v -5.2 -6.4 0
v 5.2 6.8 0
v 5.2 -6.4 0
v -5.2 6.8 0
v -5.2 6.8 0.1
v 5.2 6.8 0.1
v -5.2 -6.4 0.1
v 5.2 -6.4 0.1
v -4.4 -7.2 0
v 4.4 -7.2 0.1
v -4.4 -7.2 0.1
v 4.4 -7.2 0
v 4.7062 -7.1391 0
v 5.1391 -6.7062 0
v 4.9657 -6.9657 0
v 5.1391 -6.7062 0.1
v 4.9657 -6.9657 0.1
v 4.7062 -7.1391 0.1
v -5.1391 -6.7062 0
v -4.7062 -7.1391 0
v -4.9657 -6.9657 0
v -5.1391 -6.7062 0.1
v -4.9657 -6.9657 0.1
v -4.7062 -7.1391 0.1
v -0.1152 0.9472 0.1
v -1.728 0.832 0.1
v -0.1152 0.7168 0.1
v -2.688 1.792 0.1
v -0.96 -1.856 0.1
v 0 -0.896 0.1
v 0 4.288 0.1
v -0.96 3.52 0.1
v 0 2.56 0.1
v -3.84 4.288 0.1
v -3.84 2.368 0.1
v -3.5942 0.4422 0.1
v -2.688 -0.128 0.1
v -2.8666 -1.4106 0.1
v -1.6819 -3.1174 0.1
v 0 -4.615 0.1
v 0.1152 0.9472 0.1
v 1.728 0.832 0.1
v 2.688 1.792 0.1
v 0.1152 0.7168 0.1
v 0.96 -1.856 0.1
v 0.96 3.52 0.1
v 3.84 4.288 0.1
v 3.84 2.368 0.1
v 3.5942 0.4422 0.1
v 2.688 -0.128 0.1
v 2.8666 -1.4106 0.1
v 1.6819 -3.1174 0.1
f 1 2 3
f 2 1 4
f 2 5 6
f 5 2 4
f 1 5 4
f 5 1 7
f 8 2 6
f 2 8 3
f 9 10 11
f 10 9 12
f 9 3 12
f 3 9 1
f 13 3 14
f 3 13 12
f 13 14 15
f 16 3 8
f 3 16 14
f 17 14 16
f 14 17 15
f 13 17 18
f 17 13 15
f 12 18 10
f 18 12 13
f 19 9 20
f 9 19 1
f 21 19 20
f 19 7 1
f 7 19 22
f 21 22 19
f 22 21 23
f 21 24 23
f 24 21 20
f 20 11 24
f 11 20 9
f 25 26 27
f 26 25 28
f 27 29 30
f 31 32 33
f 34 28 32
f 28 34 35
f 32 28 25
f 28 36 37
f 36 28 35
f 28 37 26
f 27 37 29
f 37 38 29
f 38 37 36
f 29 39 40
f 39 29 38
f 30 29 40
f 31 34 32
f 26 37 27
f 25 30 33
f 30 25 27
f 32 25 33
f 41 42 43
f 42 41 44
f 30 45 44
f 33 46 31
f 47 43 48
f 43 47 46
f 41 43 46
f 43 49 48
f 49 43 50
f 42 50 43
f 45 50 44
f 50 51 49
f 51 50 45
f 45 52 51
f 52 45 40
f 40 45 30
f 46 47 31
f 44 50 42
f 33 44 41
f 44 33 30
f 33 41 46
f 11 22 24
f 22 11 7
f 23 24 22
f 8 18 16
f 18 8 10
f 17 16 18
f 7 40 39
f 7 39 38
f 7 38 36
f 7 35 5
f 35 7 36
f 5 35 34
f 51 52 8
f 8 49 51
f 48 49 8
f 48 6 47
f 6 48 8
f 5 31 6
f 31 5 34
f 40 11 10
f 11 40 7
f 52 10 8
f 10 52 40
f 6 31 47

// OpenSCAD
// file: ../p/1-4cyli.scad
use <../lib.scad>
function ldraw_lib__1_4cyli() = [
// 0 Cylinder 0.25
// 0 Name: 1-4cyli.dat
// 0 Author: James Jessiman
// 0 !LDRAW_ORG Primitive UPDATE 2012-01
// 0 !LICENSE Licensed under CC BY 2.0 and CC BY 4.0 : see CAreadme.txt
// 
// 0 BFC CERTIFY CCW
  [0,"BFC","CERTIFY"],
  [0,"BFC","CCW"],
// 
// 0 !HISTORY 2002-03-23 [sbliss] Added BFC statement.
// 0 !HISTORY 2002-04-25 [PTadmin] Official Update 2002-02
// 0 !HISTORY 2007-06-22 [PTadmin] Header formatted for Contributor Agreement
// 0 !HISTORY 2008-07-01 [PTadmin] Official Update 2008-01
// 0 !HISTORY 2012-02-16 [Philo] Changed to CCW
// 0 !HISTORY 2012-03-30 [PTadmin] Official Update 2012-01
// 
// 
// 4 16 1 1 0 0.9239 1 0.3827 0.9239 0 0.3827 1 0 0
  [4,16,1,1,0,0.9239,1,0.3827,0.9239,0,0.3827,1,0,0],
// 5 24 1 0 0 1 1 0 0.9239 0 0.3827 1 0 -1
  [5,24,1,0,0,1,1,0,0.9239,0,0.3827,1,0,-1],
// 4 16 0.9239 1 0.3827 0.7071 1 0.7071 0.7071 0 0.7071 0.9239 0 0.3827
  [4,16,0.9239,1,0.3827,0.7071,1,0.7071,0.7071,0,0.7071,0.9239,0,0.3827],
// 5 24 0.9239 0 0.3827 0.9239 1 0.3827 0.7071 0 0.7071 1 0 0
  [5,24,0.9239,0,0.3827,0.9239,1,0.3827,0.7071,0,0.7071,1,0,0],
// 4 16 0.7071 1 0.7071 0.3827 1 0.9239 0.3827 0 0.9239 0.7071 0 0.7071
  [4,16,0.7071,1,0.7071,0.3827,1,0.9239,0.3827,0,0.9239,0.7071,0,0.7071],
// 5 24 0.7071 0 0.7071 0.7071 1 0.7071 0.3827 0 0.9239 0.9239 0 0.3827
  [5,24,0.7071,0,0.7071,0.7071,1,0.7071,0.3827,0,0.9239,0.9239,0,0.3827],
// 4 16 0.3827 1 0.9239 0 1 1 0 0 1 0.3827 0 0.9239
  [4,16,0.3827,1,0.9239,0,1,1,0,0,1,0.3827,0,0.9239],
// 5 24 0.3827 0 0.9239 0.3827 1 0.9239 0 0 1 0.7071 0 0.7071
  [5,24,0.3827,0,0.9239,0.3827,1,0.9239,0,0,1,0.7071,0,0.7071],
// 5 24 0 0 1 0 1 1 0.3827 0 0.9239 -1 0 1
  [5,24,0,0,1,0,1,1,0.3827,0,0.9239,-1,0,1],
];
makepoly(ldraw_lib__1_4cyli(), line=0.2);
// file: s/3238s02.scad
use <../../lib.scad>
use <../../p/1-4chrd.scad>
use <../../p/1-4cyli.scad>
function ldraw_lib__s__3238s02() = [
// 0 ~Sticker Minifig Vest - box
// 0 Name: s\3238s02.dat
// 0 Author: Alex Taylor [anathema]
// 0 !LDRAW_ORG Subpart UPDATE 2020-03
// 0 !LICENSE Licensed under CC BY 2.0 and CC BY 4.0 : see CAreadme.txt
// 
// 0 BFC CERTIFY CCW
  [0,"BFC","CERTIFY"],
  [0,"BFC","CCW"],
// 
// 0 !HISTORY 2010-04-05 [PTadmin] Official Update 2010-01
// 0 !HISTORY 2020-11-01 [MMR1988] Fixed t-junctions
// 0 !HISTORY 2020-12-29 [PTadmin] Official Update 2020-03
// 
// 
// 4 16 13 0 17 13 0 -16 -13 0 -16 -13 0 17
  [4,16,13,0,17,13,0,-16,-13,0,-16,-13,0,17],
// 4 16 -13 -0.25 17 13 -0.25 17 13 0 17 -13 0 17
  [4,16,-13,-0.25,17,13,-0.25,17,13,0,17,-13,0,17],
// 4 16 -13 0 17 -13 0 -16 -13 -0.25 -16 -13 -0.25 17
  [4,16,-13,0,17,-13,0,-16,-13,-0.25,-16,-13,-0.25,17],
// 4 16 13 -0.25 17 13 -0.25 -16 13 0 -16 13 0 17
  [4,16,13,-0.25,17,13,-0.25,-16,13,0,-16,13,0,17],
// 4 16 -11 0 -18 11 0 -18 11 -0.25 -18 -11 -0.25 -18
  [4,16,-11,0,-18,11,0,-18,11,-0.25,-18,-11,-0.25,-18],
// 4 16 -13 0 -16 13 0 -16 11 0 -18 -11 0 -18
  [4,16,-13,0,-16,13,0,-16,11,0,-18,-11,0,-18],
// 1 16 11 0 -16 0 0 2 0 -1 0 -2 0 0 1-4chrd.dat
  [1,16,11,0,-16,0,0,2,0,-1,0,-2,0,0, ldraw_lib__1_4chrd()],
// 1 16 11 0 -16 2 0 0 0 -0.25 0 0 0 -2 1-4cyli.dat
  [1,16,11,0,-16,2,0,0,0,-0.25,0,0,0,-2, ldraw_lib__1_4cyli()],
// 1 16 -11 0 -16 0 0 -2 0 -1 0 -2 0 0 1-4chrd.dat
  [1,16,-11,0,-16,0,0,-2,0,-1,0,-2,0,0, ldraw_lib__1_4chrd()],
// 1 16 -11 0 -16 -2 0 0 0 -0.25 0 0 0 -2 1-4cyli.dat
  [1,16,-11,0,-16,-2,0,0,0,-0.25,0,0,0,-2, ldraw_lib__1_4cyli()],
];
makepoly(ldraw_lib__s__3238s02(), line=0.2);
// file: s/003238s6.scad
use <../../lib.scad>
function ldraw_lib__s__003238s6() = [
// 0 ~White Maltese Cross on Red - 1/2 Pattern
// 0 Name: s\003238s6.dat
// 0 Author: Alex Taylor [anathema]
// 0 !LDRAW_ORG Subpart UPDATE 2020-03
// 0 !LICENSE Licensed under CC BY 2.0 and CC BY 4.0 : see CAreadme.txt
// 
// 0 BFC CERTIFY CCW
  [0,"BFC","CERTIFY"],
  [0,"BFC","CCW"],
// 
// 0 !HISTORY 2010-04-05 [PTadmin] Official Update 2010-01
// 0 !HISTORY 2020-10-30 [MMR1988] Removed T-junctions, reduced mesh
// 0 !HISTORY 2020-12-29 [PTadmin] Official Update 2020-03
// 
// 
// 4 15 -0.6 0 -3.4 -14 0 1 -9 0 -4 -0.6 0 -4.6
  [4,15,-0.6,0,-3.4,-14,0,1,-9,0,-4,-0.6,0,-4.6],
// 3 15 -0.6 0 -4.6 -5 0 -18 0 0 -13
  [3,15,-0.6,0,-4.6,-5,0,-18,0,0,-13],
// 3 4 0 0 14 -5 0 10 0 0 5
  [3,4,0,0,14,-5,0,10,0,0,5],
// 4 4 -20 0 14 -20 0 4 -14 0 1 -5 0 10
  [4,4,-20,0,14,-20,0,4,-14,0,1,-5,0,10],
// 3 4 -5 0 10 -14 0 1 -0.6 0 -3.4
  [3,4,-5,0,10,-14,0,1,-0.6,0,-3.4],
// 4 4 -14 0 -9 -14 0 1 -20 0 4 -18.72 0 -6.03
  [4,4,-14,0,-9,-14,0,1,-20,0,4,-18.72,0,-6.03],
// 3 4 -14 0 1 -14 0 -9 -9 0 -4
  [3,4,-14,0,1,-14,0,-9,-9,0,-4],
// 3 4 -0.6 0 -4.6 -14 0 -9 -5 0 -18
  [3,4,-0.6,0,-4.6,-14,0,-9,-5,0,-18],
// 4 4 -5 0 -18 -14 0 -9 -18.72 0 -6.03 -14.93 0 -15.68
  [4,4,-5,0,-18,-14,0,-9,-18.72,0,-6.03,-14.93,0,-15.68],
// 4 4 0 0 -32.37 -5 0 -18 -14.93 0 -15.68 -8.76 0 -24.57
  [4,4,0,0,-32.37,-5,0,-18,-14.93,0,-15.68,-8.76,0,-24.57],
// 3 4 0 0 -13 -5 0 -18 0 0 -32.37
  [3,4,0,0,-13,-5,0,-18,0,0,-32.37],
// 3 4 0 0 14 -20 0 14 -5 0 10
  [3,4,0,0,14,-20,0,14,-5,0,10],
// 3 15 -9 0 -4 -14 0 -9 -0.6 0 -4.6
  [3,15,-9,0,-4,-14,0,-9,-0.6,0,-4.6],
// 4 15 -0.6 0 -3.4 -0.6 0 -4.6 0 0 -13 0 0 5
  [4,15,-0.6,0,-3.4,-0.6,0,-4.6,0,0,-13,0,0,5],
// 3 15 -5 0 10 -0.6 0 -3.4 0 0 5
  [3,15,-5,0,10,-0.6,0,-3.4,0,0,5],
];
makepoly(ldraw_lib__s__003238s6(), line=0.2);
// file: ../p/1-4chrd.scad
use <../lib.scad>
function ldraw_lib__1_4chrd() = [
// 0 Chord 0.25
// 0 Name: 1-4chrd.dat
// 0 Author: Tony Hafner [hafhead]
// 0 !LDRAW_ORG Primitive UPDATE 2012-02
// 0 !LICENSE Licensed under CC BY 2.0 and CC BY 4.0 : see CAreadme.txt
// 
// 0 BFC CERTIFY CCW
  [0,"BFC","CERTIFY"],
  [0,"BFC","CCW"],
// 
// 0 !HISTORY 2004-04-22 [PTadmin] Official Update 2004-02
// 0 !HISTORY 2007-10-09 [PTadmin] Header formatted for Contributor Agreement
// 0 !HISTORY 2008-07-01 [PTadmin] Official Update 2008-01
// 0 !HISTORY 2012-08-02 [MMR1988] Re-creation with PrimGen2 and Rectifier
// 0 !HISTORY 2012-08-09 [PTadmin] Official Update 2012-02
// 
// 
// 4 16 0.9239 0 0.3827 0.3827 0 0.9239 0 0 1 1 0 0
  [4,16,0.9239,0,0.3827,0.3827,0,0.9239,0,0,1,1,0,0],
// 3 16 0.7071 0 0.7071 0.3827 0 0.9239 0.9239 0 0.3827
  [3,16,0.7071,0,0.7071,0.3827,0,0.9239,0.9239,0,0.3827],
];
makepoly(ldraw_lib__1_4chrd(), line=0.2);
// main file
use <../lib.scad>
use <../p/1-4chrd.scad>
use <s/003238s6.scad>
use <s/3238s02.scad>
function ldraw_lib__003238p() = [
// 0 Sticker Minifig Vest with Shield with White Maltese Cross on Light Grey Background
// 0 Name: 003238p.dat
// 0 Author: Alex Taylor [anathema]
// 0 !LDRAW_ORG Part UPDATE 2020-03
// 0 !LICENSE Licensed under CC BY 2.0 and CC BY 4.0 : see CAreadme.txt
// 
// 0 BFC CERTIFY CCW
  [0,"BFC","CERTIFY"],
  [0,"BFC","CCW"],
// 
// 0 !KEYWORDS Castle, Malta, part 3840, set 375-2, set 6075-2
// 
// 0 !HISTORY 2010-04-05 [PTadmin] Official Update 2010-01
// 0 !HISTORY 2019-09-08 [anathema] Corrected colour of back
// 0 !HISTORY 2020-11-01 [MMR1988] Fixed overlapping and t-junctions
// 0 !HISTORY 2020-12-29 [PTadmin] Official Update 2020-03
// 
// 
// 1 16 0 0 0 1 0 0 0 1 0 0 0 1 s\3238s02.dat
  [1,16,0,0,0,1,0,0,0,1,0,0,0,1, ldraw_lib__s__3238s02()],
// 1 16 0 -0.25 4 0.48 0 0 0 1 0 0 0 0.48 s\003238s6.dat
  [1,16,0,-0.25,4,0.48,0,0,0,1,0,0,0,0.48, ldraw_lib__s__003238s6()],
// 1 16 0 -0.25 4 -0.48 0 0 0 1 0 0 0 0.48 s\003238s6.dat
  [1,16,0,-0.25,4,-0.48,0,0,0,1,0,0,0,0.48, ldraw_lib__s__003238s6()],
// 1 7 -11 -0.25 -16 -2 0 0 0 1 0 0 0 -2 1-4chrd.dat
  [1,7,-11,-0.25,-16,-2,0,0,0,1,0,0,0,-2, ldraw_lib__1_4chrd()],
// 1 7 11 -0.25 -16 0 0 2 0 1 0 -2 0 0 1-4chrd.dat
  [1,7,11,-0.25,-16,0,0,2,0,1,0,-2,0,0, ldraw_lib__1_4chrd()],
// 3 7 -13 -.25 -16 0 -.25 -11.5376 -4.2048 -.25 -7.7936
  [3,7,-13,-.25,-16,0,-.25,-11.5376,-4.2048,-.25,-7.7936],
// 3 7 -13 -.25 -16 -4.2048 -.25 -7.7936 -7.1664 -.25 -3.5264
  [3,7,-13,-.25,-16,-4.2048,-.25,-7.7936,-7.1664,-.25,-3.5264],
// 3 7 -13 -.25 -16 -7.1664 -.25 -3.5264 -8.9856 -.25 1.1056
  [3,7,-13,-.25,-16,-7.1664,-.25,-3.5264,-8.9856,-.25,1.1056],
// 4 7 -13 -.25 -16 -8.9856 -.25 1.1056 -9.6 -.25 5.92 -13 -.25 17
  [4,7,-13,-.25,-16,-8.9856,-.25,1.1056,-9.6,-.25,5.92,-13,-.25,17],
// 3 7 -13 -.25 17 -9.6 -.25 5.92 -9.6 -.25 10.72
  [3,7,-13,-.25,17,-9.6,-.25,5.92,-9.6,-.25,10.72],
// 3 7 7.1664 -.25 -3.5264 4.2048 -.25 -7.7936 13 -.25 -16
  [3,7,7.1664,-.25,-3.5264,4.2048,-.25,-7.7936,13,-.25,-16],
// 3 7 13 -.25 -16 8.9856 -.25 1.1056 7.1664 -.25 -3.5264
  [3,7,13,-.25,-16,8.9856,-.25,1.1056,7.1664,-.25,-3.5264],
// 3 7 9.6 -.25 5.92 8.9856 -.25 1.1056 13 -.25 -16
  [3,7,9.6,-.25,5.92,8.9856,-.25,1.1056,13,-.25,-16],
// 4 7 13 -.25 -16 13 -.25 17 9.6 -.25 10.72 9.6 -.25 5.92
  [4,7,13,-.25,-16,13,-.25,17,9.6,-.25,10.72,9.6,-.25,5.92],
// 4 7 13 -0.25 17 -13 -0.25 17 -9.6 -0.25 10.72 0 -0.25 10.72
  [4,7,13,-0.25,17,-13,-0.25,17,-9.6,-0.25,10.72,0,-0.25,10.72],
// 4 7 -13 -.25 -16 -11 -.25 -18 11 -.25 -18 0 -.25 -11.5376
  [4,7,-13,-.25,-16,-11,-.25,-18,11,-.25,-18,0,-.25,-11.5376],
// 4 7 0 -.25 -11.5376 11 -.25 -18 13 -.25 -16 4.2048 -.25 -7.7936
  [4,7,0,-.25,-11.5376,11,-.25,-18,13,-.25,-16,4.2048,-.25,-7.7936],
// 3 7 13 -0.25 17 0 -0.25 10.72 9.6 -0.25 10.72
  [3,7,13,-0.25,17,0,-0.25,10.72,9.6,-0.25,10.72],
];
makepoly(ldraw_lib__003238p(), line=0.2);
